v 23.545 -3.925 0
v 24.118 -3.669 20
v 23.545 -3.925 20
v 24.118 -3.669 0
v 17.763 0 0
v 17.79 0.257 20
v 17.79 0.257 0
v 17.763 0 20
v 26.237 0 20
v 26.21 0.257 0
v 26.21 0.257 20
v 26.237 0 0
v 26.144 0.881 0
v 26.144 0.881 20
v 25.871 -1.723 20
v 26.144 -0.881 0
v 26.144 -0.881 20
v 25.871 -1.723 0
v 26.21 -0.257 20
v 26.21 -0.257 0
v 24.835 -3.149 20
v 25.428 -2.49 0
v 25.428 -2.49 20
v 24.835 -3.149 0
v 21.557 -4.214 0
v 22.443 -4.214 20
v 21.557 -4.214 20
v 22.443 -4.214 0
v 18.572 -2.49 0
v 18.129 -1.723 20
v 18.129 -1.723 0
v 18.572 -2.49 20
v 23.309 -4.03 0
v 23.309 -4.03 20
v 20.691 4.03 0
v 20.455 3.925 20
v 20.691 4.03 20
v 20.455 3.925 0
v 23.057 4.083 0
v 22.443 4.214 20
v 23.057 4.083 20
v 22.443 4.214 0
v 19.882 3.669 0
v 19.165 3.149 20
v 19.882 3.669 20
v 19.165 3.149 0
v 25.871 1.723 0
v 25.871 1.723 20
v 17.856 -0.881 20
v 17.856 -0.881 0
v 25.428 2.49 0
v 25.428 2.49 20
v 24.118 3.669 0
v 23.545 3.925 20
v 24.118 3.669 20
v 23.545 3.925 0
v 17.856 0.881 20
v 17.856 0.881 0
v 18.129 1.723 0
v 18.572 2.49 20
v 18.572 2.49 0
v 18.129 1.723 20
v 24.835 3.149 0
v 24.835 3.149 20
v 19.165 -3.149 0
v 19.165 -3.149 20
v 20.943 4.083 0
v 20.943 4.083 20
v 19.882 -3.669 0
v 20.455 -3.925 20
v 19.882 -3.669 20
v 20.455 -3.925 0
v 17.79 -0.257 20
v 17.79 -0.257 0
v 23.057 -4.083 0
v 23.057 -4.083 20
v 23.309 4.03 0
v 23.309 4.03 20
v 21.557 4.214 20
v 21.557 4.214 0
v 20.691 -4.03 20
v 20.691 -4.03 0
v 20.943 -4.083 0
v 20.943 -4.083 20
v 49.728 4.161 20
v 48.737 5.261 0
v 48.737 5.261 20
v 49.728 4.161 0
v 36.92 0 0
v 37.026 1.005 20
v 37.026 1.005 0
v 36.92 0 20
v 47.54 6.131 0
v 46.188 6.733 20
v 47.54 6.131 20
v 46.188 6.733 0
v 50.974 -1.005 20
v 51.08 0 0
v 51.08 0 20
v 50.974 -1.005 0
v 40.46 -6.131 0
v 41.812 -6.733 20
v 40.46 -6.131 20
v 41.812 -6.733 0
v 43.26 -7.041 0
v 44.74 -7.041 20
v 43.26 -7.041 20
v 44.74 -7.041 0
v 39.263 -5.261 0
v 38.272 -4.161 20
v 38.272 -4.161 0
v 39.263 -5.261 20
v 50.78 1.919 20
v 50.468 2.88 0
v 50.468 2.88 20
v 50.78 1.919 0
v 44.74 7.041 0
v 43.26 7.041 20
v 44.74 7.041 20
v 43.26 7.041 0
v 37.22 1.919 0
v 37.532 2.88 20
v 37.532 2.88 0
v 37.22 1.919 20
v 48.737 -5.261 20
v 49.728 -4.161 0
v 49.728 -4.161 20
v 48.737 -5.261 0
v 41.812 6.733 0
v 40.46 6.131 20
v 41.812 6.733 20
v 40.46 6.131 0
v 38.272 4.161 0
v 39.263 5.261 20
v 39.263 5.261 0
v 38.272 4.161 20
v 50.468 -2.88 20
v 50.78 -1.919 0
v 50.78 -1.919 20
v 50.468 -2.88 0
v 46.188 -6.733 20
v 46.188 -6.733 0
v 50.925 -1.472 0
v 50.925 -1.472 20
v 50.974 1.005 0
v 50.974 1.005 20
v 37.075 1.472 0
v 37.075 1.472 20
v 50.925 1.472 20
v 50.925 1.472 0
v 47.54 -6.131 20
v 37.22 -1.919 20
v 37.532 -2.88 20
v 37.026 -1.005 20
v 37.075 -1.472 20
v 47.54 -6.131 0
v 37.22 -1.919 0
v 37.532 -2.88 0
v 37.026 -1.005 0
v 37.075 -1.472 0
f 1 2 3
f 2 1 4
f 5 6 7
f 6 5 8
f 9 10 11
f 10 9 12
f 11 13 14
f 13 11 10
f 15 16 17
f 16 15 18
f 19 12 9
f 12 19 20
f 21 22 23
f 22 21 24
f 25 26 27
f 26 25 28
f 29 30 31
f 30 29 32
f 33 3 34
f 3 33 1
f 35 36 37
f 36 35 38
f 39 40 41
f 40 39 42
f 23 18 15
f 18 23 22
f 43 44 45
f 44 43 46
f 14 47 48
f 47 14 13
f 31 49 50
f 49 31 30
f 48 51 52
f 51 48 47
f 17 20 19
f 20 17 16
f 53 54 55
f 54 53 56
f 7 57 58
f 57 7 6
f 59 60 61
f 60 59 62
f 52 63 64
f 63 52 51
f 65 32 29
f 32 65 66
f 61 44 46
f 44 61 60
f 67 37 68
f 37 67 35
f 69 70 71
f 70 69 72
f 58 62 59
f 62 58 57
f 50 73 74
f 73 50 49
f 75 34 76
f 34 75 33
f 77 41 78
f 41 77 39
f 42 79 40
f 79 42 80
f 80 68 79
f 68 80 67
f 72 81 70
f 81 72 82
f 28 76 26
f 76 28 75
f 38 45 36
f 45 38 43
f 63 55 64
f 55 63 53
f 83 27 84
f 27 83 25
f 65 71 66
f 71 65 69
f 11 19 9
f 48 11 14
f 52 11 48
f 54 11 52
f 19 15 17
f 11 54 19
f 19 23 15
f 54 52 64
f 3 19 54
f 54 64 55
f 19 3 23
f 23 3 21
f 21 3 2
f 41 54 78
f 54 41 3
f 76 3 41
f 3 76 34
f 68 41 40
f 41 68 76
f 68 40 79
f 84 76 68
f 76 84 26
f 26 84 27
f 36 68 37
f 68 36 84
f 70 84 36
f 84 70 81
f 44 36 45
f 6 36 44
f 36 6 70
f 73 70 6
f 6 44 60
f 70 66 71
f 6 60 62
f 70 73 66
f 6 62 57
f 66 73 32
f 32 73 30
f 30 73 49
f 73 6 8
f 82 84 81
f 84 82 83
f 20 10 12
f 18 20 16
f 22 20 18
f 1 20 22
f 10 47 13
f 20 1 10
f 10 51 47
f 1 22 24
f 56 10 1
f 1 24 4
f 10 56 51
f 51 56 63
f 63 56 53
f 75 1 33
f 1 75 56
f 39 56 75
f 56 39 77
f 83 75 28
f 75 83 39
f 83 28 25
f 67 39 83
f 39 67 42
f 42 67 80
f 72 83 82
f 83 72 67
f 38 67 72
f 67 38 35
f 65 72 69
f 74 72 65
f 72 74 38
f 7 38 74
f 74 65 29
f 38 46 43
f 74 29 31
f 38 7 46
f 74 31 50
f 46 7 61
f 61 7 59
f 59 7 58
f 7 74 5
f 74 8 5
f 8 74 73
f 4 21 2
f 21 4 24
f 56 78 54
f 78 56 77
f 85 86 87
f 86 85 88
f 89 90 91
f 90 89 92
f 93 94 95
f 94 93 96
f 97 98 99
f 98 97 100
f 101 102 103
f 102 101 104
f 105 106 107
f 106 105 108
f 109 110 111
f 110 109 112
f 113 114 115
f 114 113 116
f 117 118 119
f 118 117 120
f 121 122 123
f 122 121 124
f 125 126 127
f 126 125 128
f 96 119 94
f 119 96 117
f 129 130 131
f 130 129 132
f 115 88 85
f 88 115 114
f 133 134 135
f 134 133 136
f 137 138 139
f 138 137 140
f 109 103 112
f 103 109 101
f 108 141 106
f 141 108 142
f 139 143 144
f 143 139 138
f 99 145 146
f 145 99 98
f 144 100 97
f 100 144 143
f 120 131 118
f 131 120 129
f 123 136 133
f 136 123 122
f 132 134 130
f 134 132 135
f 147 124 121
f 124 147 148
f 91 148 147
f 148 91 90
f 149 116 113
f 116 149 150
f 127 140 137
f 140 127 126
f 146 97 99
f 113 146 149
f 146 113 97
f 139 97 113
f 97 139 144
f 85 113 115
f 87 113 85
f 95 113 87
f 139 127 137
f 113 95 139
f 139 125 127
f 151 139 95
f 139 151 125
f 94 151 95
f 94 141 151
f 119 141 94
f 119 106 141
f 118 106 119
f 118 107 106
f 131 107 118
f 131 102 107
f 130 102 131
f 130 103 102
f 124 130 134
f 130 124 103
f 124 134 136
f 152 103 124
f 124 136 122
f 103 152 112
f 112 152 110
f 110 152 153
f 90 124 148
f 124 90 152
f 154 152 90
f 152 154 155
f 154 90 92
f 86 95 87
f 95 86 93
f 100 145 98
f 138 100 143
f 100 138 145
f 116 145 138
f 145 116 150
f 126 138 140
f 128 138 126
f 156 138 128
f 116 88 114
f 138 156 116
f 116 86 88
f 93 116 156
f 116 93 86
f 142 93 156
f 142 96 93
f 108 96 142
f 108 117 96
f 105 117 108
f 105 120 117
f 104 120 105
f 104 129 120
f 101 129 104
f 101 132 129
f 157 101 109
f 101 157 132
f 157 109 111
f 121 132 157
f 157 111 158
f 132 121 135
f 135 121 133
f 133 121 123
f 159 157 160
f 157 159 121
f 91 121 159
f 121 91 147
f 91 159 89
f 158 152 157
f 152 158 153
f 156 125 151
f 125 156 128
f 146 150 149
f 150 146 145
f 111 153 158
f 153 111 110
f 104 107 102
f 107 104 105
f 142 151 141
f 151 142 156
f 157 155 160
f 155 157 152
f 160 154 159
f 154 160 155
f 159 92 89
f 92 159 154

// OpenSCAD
// Linear extrude
translate([22,0,0]) linear_extrude(height=20) projection(cut=true) translate([0,0,9]) sphere(r=10);
translate([44,0,0]) linear_extrude(height=20) projection(cut=true) translate([0,0,7]) sphere(r=10);
